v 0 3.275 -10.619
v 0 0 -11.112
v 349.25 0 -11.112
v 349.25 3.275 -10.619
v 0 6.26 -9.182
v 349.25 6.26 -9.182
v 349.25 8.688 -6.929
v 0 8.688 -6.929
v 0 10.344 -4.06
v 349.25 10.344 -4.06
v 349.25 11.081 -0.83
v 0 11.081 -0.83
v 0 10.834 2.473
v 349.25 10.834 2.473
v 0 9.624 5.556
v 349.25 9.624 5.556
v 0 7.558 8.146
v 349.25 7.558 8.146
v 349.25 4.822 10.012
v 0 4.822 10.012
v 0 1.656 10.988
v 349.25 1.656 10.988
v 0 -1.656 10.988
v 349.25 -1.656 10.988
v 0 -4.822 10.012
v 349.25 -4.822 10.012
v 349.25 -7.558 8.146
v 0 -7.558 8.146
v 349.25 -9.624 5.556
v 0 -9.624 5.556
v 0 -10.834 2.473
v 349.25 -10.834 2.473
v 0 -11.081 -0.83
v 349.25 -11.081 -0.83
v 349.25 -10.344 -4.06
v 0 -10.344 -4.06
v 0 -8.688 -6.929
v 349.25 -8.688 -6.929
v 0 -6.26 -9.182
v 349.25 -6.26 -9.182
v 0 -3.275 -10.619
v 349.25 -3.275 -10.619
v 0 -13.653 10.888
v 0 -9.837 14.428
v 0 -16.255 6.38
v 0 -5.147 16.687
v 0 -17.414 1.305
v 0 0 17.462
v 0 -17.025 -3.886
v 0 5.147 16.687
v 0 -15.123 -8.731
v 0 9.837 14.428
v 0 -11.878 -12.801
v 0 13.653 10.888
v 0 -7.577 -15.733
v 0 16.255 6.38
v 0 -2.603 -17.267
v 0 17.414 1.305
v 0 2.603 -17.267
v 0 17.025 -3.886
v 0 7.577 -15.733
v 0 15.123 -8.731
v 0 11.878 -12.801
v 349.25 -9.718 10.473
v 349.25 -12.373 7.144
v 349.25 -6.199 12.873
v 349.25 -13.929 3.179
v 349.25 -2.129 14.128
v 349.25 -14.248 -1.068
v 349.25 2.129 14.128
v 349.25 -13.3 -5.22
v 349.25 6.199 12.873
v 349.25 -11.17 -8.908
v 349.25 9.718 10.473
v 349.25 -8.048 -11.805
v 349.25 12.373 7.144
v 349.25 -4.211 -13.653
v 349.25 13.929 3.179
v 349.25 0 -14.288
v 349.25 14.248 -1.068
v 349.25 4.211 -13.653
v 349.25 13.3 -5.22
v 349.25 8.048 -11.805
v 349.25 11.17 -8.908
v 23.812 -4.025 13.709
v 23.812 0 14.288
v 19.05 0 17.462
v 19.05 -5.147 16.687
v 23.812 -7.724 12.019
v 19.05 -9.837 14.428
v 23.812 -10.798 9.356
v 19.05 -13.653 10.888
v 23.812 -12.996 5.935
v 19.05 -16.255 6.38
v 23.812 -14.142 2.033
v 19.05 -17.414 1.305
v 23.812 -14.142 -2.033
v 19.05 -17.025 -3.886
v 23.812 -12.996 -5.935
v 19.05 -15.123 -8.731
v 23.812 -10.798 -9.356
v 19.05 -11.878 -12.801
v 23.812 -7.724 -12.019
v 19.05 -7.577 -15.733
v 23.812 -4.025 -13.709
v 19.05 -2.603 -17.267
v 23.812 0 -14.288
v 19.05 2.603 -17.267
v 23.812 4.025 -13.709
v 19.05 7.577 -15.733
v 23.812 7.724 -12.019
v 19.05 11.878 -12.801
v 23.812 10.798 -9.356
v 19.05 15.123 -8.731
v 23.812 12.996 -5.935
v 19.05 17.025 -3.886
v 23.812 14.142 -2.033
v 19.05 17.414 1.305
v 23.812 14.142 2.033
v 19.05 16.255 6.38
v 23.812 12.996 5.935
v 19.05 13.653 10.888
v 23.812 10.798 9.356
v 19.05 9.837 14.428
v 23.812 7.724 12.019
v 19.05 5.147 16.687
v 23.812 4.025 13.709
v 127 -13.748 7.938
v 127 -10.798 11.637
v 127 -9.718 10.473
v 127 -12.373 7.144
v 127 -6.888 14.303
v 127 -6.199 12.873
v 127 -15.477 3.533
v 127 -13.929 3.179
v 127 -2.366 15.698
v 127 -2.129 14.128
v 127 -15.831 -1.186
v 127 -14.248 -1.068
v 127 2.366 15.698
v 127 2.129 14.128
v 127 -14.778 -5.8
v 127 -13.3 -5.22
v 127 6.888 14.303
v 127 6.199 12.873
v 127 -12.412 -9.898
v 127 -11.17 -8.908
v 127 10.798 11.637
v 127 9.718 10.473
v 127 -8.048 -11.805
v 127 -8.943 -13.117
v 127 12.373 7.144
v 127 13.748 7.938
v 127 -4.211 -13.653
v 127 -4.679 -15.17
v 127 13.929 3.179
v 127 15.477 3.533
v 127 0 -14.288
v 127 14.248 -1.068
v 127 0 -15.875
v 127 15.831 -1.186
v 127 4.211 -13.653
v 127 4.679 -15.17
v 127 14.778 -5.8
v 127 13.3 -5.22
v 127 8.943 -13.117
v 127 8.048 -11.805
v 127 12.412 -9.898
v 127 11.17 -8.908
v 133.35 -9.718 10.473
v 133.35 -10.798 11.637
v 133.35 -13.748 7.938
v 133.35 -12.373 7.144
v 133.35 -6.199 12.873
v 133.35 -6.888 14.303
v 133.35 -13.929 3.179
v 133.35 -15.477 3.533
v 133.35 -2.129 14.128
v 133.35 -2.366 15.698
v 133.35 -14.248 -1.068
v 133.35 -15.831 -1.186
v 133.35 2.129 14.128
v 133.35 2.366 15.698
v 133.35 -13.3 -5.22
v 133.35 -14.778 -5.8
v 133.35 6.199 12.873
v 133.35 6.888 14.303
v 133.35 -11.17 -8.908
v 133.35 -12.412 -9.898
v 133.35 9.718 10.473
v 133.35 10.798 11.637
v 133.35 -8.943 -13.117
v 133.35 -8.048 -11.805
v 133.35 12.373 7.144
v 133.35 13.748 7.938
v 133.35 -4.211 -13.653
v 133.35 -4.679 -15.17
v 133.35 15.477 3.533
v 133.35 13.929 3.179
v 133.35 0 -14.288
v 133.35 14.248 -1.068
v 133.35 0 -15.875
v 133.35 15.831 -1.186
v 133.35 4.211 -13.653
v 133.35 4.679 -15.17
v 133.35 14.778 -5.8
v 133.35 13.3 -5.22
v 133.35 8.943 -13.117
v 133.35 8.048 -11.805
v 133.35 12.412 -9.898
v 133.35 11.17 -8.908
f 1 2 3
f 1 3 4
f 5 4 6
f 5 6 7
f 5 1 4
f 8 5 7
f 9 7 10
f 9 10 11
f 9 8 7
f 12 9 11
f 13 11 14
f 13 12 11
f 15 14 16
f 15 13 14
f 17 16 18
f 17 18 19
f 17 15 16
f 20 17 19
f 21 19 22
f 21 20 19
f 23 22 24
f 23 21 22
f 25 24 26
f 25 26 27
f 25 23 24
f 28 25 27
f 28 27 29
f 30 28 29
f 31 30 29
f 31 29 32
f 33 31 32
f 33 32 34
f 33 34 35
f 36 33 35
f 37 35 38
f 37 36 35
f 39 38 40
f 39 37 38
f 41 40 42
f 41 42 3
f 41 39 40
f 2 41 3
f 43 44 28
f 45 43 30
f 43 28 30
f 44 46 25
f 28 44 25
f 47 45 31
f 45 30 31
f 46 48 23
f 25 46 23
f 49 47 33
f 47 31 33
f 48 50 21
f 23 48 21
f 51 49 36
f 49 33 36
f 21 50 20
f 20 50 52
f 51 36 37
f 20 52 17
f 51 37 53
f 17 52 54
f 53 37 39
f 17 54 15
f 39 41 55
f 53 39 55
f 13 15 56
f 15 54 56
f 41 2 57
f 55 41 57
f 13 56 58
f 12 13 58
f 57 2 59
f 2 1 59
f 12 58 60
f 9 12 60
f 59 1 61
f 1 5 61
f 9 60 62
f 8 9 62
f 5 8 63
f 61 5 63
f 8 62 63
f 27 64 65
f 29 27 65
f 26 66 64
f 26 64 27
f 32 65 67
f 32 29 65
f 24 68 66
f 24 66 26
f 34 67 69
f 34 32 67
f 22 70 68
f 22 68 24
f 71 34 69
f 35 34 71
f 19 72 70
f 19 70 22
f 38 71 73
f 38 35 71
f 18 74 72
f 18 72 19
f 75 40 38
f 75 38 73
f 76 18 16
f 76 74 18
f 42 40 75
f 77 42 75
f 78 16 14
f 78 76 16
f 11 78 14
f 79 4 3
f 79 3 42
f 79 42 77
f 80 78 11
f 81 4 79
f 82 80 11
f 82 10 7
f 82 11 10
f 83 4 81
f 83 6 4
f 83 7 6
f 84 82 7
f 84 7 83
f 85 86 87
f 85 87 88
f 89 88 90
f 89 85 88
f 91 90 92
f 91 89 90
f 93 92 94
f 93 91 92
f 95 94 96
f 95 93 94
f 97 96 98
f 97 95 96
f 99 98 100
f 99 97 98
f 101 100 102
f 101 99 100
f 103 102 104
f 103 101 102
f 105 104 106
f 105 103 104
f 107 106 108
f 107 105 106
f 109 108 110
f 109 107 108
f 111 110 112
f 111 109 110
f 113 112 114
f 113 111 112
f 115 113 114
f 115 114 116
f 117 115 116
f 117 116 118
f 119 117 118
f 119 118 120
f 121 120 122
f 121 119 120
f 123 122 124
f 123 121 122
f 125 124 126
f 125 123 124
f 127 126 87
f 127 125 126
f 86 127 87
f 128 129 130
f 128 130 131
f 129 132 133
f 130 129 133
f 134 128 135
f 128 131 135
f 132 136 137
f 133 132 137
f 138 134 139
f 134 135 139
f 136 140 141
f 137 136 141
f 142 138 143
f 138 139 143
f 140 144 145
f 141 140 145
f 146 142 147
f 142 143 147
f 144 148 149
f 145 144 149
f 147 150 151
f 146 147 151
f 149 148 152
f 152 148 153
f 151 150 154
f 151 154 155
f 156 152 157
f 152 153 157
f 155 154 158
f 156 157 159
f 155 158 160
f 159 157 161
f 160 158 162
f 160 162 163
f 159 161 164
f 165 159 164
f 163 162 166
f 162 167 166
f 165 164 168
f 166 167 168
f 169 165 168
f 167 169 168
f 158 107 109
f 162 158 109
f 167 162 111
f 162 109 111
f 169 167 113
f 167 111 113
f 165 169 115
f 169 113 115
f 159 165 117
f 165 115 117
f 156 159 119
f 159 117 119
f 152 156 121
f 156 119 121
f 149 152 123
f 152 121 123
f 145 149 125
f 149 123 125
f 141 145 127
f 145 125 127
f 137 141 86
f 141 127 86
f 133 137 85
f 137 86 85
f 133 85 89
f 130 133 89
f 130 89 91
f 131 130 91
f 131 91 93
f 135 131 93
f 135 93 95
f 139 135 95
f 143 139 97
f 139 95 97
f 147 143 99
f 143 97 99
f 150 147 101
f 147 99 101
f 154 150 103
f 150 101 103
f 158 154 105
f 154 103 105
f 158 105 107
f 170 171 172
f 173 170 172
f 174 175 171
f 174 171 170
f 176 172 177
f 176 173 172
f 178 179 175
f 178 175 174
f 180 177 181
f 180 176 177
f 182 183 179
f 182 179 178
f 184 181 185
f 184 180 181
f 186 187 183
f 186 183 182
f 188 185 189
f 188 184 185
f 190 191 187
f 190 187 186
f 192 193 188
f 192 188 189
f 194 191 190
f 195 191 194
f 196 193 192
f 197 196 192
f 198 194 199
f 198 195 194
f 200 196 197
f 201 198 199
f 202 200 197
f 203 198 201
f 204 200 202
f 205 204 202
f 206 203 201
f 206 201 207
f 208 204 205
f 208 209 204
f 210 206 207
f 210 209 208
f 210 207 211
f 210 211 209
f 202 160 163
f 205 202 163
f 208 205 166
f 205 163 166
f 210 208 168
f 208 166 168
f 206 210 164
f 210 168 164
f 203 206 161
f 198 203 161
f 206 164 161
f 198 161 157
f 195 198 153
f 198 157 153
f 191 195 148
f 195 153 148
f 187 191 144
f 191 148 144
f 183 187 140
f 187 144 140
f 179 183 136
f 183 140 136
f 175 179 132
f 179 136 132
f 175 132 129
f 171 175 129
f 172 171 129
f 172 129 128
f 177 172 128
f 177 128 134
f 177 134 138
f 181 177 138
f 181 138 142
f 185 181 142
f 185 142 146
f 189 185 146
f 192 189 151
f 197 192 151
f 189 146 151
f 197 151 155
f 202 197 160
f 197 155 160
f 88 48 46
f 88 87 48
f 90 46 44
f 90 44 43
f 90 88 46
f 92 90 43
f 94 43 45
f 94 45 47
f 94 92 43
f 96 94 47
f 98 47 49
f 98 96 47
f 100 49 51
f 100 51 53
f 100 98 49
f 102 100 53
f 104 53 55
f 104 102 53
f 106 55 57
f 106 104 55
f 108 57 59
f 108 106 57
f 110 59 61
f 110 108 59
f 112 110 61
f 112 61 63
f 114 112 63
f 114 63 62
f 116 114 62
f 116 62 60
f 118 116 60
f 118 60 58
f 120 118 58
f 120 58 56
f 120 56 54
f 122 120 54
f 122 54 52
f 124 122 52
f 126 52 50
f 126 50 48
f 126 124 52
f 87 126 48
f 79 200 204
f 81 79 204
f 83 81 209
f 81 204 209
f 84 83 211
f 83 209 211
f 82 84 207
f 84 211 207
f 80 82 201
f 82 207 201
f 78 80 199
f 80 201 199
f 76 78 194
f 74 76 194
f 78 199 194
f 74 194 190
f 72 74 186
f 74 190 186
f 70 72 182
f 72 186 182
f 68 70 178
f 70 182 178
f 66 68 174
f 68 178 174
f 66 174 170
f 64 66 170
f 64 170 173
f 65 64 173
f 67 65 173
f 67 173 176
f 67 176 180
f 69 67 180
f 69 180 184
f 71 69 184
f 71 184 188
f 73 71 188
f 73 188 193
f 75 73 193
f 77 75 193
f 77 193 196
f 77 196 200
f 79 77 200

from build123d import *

# Parameters (mm, degrees)
SKETCH1_R           = 14.2875
SKETCH1_R_2         = 11.1125
BOSS_EXTRUDE1_DEPTH = 349.25
SKETCH2_R           = 15.875
SKETCH2_R_2         = 12.674707898
BOSS_EXTRUDE2_DEPTH = 6.35


with BuildPart() as part:
    # Sketch1 → Boss-Extrude1 (new body)
    with BuildSketch(Plane(origin=(0, 0, 0), x_dir=(0, 0, -1), z_dir=(1, 0, 0))):
        Circle(SKETCH1_R)
        Circle(SKETCH1_R_2, mode=Mode.SUBTRACT)
    extrude(amount=BOSS_EXTRUDE1_DEPTH)

    # Sketch2 → Boss-Extrude2 (add)
    with BuildSketch(Plane(origin=(127, 0, 0), x_dir=(0, 0, -1), z_dir=(1, 0, 0))):
        Circle(SKETCH2_R)
        Circle(SKETCH2_R_2, mode=Mode.SUBTRACT)
    extrude(amount=BOSS_EXTRUDE2_DEPTH)

    # Sketch3 → Revolve1 (revolve)
    with BuildSketch(Plane.XY, mode=Mode.PRIVATE) as revolve1_sk:
        Polygon((23.8125, 12.531653429), (0, 12.531653429), (0, 17.4625), (19.05, 17.4625), (23.8125, 14.2875), align=None)
    revolve(revolve1_sk.sketch.rotate(Axis((0, 0, 0), (1, 0, 0)), 90), axis=Axis((0, 0, 0), (1, 0, 0)))


solid = part.part
